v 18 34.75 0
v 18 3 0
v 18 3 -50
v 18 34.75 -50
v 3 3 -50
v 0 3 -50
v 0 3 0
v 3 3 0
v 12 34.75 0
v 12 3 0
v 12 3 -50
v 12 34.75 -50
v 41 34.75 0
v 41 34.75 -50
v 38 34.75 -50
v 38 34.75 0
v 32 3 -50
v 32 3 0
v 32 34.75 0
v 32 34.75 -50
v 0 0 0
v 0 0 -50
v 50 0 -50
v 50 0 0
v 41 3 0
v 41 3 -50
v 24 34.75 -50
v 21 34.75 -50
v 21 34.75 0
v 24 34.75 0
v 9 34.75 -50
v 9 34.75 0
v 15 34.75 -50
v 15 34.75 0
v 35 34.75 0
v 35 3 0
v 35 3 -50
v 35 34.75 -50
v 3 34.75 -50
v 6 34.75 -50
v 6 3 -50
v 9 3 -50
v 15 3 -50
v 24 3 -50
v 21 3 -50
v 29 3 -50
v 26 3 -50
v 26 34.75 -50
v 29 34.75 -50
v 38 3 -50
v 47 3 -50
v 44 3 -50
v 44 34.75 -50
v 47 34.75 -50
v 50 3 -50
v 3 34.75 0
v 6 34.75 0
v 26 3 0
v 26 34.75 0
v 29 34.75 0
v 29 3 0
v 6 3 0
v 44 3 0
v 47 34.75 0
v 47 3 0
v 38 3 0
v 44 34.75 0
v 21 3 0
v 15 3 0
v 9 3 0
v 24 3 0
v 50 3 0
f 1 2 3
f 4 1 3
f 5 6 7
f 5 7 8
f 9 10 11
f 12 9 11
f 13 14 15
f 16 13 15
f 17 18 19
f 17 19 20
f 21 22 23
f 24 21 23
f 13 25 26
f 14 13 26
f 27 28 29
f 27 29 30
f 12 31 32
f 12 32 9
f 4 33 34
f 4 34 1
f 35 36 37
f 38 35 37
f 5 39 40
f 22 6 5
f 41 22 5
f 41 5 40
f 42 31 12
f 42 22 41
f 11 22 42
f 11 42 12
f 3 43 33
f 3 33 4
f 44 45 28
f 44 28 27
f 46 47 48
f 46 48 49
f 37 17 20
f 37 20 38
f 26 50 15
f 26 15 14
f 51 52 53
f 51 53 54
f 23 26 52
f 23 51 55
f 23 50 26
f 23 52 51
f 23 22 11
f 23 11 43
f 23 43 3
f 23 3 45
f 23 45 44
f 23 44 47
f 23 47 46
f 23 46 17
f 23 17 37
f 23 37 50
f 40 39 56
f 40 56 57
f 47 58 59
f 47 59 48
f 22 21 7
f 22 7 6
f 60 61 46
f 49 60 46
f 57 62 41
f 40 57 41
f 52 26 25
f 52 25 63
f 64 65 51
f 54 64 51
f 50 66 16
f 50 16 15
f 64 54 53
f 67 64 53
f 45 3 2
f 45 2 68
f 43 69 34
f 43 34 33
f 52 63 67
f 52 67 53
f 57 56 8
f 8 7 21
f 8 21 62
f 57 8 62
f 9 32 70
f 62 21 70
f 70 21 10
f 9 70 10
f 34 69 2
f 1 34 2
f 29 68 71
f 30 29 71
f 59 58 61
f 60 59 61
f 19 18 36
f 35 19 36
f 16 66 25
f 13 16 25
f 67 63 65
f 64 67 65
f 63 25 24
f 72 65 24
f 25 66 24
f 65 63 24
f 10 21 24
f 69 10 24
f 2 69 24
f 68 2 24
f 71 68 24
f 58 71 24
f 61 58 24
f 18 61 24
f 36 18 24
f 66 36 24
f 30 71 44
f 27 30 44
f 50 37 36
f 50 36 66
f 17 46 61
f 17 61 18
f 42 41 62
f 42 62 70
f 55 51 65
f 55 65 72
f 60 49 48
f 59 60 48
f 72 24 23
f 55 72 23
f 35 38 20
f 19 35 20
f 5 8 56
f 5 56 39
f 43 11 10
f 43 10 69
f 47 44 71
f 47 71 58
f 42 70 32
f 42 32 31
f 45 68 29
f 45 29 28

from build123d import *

# Parameters (mm, degrees)
SKETCH2_W           = 50
SKETCH2_H           = 50
BOSS_EXTRUDE1_DEPTH = 3
SKETCH3_W           = 3
SKETCH3_H           = 50
BOSS_EXTRUDE2_DEPTH = 31.75


with BuildPart() as part:
    # Sketch2 → Boss-Extrude1 (new body)
    with BuildSketch(Plane(origin=(0, 0, 0), x_dir=(1, 0, 0), z_dir=(0, 1, 0))):
        with Locations((25, 25)):
            Rectangle(SKETCH2_W, SKETCH2_H)
    extrude(amount=BOSS_EXTRUDE1_DEPTH)

    # Sketch3 → Boss-Extrude2 (add)
    with BuildSketch(Plane(origin=(0, 3, 0), x_dir=(1, 0, 0), z_dir=(0, 1, 0))):
        with Locations((4.5, 25)):
            Rectangle(SKETCH3_W, SKETCH3_H)
        with Locations((10.5, 25)):
            Rectangle(SKETCH3_W, SKETCH3_H)
        with Locations((16.5, 25)):
            Rectangle(SKETCH3_W, SKETCH3_H)
        with Locations((22.5, 25)):
            Rectangle(SKETCH3_W, SKETCH3_H)
    boss_extrude2 = extrude(amount=BOSS_EXTRUDE2_DEPTH)

    # Mirror1: Boss-Extrude2 across plane
    add(boss_extrude2.mirror(Plane.ZY.offset(-25)))


solid = part.part
